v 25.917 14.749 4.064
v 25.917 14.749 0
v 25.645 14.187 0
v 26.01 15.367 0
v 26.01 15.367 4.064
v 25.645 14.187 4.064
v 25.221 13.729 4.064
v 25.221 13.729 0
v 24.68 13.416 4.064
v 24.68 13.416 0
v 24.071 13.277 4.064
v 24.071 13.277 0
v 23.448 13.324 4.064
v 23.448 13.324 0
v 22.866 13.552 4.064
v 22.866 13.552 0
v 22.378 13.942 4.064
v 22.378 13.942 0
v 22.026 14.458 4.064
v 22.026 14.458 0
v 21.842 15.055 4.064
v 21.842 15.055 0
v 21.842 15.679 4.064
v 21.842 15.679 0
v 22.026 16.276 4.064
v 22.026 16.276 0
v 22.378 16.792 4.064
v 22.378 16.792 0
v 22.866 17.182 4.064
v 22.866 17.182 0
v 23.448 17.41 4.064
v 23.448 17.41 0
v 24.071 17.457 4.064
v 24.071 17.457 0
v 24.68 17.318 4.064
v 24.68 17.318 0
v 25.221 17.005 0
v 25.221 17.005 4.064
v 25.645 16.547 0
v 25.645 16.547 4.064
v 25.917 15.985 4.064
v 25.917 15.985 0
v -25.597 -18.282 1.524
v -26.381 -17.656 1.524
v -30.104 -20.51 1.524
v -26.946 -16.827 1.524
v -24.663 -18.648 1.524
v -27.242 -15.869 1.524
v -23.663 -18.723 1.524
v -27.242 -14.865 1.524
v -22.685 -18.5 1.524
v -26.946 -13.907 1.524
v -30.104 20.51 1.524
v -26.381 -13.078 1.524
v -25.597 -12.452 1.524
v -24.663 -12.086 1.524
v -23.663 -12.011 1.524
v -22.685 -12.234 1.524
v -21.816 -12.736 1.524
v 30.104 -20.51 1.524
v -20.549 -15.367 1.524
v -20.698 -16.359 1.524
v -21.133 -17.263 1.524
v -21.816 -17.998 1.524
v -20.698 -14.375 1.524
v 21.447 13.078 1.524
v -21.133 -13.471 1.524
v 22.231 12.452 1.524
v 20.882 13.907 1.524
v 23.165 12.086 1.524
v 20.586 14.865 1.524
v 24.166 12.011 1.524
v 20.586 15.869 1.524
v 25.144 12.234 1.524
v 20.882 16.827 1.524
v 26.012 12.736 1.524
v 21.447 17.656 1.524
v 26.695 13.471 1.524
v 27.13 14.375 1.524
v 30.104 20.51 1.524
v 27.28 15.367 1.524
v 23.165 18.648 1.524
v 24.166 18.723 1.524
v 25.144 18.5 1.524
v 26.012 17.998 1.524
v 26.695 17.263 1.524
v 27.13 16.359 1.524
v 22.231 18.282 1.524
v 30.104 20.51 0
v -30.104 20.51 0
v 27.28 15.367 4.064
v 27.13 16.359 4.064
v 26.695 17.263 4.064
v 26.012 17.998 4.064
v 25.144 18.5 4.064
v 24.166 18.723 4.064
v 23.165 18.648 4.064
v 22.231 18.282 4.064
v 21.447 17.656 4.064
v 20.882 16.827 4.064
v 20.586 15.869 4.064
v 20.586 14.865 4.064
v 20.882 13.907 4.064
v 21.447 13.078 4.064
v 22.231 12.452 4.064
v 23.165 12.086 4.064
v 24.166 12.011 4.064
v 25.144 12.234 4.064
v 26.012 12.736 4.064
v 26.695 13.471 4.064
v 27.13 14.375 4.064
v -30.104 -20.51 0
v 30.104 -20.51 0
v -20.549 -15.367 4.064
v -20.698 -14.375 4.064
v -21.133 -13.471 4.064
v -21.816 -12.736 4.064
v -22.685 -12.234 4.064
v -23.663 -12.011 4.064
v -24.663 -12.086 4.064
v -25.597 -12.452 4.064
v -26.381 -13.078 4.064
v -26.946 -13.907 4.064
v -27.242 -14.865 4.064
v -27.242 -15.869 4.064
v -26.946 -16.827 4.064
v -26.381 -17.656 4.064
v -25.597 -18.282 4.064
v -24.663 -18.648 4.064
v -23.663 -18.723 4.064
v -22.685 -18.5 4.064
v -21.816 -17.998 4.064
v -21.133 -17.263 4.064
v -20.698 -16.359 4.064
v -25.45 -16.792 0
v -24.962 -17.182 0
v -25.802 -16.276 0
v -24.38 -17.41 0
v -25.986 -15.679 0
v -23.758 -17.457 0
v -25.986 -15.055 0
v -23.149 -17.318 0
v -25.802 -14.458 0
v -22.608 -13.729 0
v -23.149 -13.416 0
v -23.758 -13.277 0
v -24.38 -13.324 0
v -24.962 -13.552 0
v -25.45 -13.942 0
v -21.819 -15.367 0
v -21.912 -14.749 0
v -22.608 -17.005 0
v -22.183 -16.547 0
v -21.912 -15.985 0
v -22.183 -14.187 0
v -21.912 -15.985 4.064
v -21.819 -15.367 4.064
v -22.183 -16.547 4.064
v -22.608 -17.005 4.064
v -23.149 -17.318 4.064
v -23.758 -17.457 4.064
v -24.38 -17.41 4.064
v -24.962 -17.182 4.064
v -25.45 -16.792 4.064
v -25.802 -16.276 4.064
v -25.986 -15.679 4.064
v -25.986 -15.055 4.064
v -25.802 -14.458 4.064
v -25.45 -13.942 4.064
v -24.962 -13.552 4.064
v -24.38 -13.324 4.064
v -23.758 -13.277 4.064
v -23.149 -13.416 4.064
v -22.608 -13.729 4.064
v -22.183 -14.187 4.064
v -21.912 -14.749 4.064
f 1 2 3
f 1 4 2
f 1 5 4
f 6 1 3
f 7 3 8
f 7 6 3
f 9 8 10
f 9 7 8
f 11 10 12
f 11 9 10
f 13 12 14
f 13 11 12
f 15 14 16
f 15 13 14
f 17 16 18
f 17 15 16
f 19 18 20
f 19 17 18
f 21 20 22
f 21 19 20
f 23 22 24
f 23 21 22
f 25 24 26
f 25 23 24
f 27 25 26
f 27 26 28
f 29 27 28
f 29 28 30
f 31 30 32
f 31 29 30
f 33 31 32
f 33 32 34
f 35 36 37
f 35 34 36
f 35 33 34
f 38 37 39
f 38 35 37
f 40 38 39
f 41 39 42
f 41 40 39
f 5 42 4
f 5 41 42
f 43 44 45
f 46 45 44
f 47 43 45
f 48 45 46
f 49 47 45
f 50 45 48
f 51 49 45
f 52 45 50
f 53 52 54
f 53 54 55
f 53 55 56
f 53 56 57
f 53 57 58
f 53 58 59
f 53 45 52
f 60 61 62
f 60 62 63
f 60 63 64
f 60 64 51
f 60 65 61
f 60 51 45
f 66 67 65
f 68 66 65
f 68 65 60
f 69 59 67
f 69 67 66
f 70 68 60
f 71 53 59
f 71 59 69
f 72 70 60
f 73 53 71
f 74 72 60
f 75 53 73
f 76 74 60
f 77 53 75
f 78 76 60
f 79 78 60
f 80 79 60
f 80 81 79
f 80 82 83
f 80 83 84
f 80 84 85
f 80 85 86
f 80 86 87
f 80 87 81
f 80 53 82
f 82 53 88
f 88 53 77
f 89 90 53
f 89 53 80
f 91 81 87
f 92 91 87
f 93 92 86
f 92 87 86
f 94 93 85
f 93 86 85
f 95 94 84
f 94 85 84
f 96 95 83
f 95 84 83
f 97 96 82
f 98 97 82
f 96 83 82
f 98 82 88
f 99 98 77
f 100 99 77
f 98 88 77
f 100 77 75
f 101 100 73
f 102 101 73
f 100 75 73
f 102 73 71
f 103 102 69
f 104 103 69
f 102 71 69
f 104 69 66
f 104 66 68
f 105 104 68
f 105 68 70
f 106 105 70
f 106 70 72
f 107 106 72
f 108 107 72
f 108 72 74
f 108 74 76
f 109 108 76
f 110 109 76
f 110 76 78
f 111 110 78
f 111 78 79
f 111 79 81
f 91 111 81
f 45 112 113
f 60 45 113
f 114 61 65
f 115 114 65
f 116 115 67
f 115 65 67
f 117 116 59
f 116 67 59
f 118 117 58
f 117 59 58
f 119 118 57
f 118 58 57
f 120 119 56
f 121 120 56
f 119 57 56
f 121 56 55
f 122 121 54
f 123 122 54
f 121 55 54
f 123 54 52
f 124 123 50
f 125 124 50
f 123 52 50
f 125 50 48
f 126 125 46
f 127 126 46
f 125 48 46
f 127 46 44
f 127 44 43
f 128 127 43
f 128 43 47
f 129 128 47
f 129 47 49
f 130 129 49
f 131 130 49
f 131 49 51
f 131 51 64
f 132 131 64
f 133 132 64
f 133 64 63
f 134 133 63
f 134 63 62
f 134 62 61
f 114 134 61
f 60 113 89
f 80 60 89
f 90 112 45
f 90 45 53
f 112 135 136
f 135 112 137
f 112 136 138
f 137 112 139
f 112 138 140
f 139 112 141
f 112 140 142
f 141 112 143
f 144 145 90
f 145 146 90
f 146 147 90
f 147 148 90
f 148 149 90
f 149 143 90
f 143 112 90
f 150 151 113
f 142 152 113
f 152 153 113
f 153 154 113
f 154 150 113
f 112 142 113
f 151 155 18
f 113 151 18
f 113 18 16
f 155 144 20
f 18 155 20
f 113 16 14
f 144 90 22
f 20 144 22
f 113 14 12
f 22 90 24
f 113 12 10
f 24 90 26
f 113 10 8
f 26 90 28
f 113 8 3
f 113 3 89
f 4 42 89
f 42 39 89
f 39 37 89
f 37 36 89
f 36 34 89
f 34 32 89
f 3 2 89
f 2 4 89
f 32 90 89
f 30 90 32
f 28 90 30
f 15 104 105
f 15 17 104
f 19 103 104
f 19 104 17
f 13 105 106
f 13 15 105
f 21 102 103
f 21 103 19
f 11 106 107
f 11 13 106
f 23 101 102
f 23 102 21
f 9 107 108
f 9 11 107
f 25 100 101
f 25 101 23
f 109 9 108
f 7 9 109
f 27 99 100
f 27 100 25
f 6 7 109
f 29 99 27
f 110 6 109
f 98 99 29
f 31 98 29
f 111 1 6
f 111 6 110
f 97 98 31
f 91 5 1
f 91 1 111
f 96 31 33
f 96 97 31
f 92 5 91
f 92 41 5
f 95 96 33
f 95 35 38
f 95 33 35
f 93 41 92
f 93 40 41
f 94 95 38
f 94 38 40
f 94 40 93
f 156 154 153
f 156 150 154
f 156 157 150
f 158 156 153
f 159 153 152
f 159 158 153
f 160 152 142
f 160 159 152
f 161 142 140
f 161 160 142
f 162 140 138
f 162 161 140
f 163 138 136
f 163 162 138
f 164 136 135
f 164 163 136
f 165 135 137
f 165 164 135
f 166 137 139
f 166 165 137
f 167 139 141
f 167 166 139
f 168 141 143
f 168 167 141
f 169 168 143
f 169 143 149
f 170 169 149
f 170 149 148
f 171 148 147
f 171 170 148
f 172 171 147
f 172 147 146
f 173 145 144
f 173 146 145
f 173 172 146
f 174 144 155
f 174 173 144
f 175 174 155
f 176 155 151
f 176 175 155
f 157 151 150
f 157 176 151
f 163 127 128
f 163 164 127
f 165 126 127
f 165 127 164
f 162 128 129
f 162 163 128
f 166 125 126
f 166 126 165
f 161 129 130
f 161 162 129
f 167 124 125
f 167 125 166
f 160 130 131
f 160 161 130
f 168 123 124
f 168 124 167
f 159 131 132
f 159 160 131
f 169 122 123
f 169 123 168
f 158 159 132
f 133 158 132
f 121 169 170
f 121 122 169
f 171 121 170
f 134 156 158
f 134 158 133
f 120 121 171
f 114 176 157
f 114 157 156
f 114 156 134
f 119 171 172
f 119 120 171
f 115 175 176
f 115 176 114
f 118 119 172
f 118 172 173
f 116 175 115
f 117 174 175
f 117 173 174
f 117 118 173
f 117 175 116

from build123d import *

# Parameters (mm, degrees)
F8_W      = 60.2088514067
F8_H      = 41.021
F9_DEPTH  = 1.524
F6_R      = 3.3655
F6_R_2    = 2.0955
F7_R      = 3.3655
F7_R_2    = 2.0955
F10_DEPTH = 4.064
F11_DEPTH = 25.4


with BuildPart() as f9:
    # F8 (on Top) → F9 (new body)
    with BuildSketch(Plane.XY):
        Rectangle(F8_W, F8_H)
    extrude(amount=F9_DEPTH)

    # F6 (on face) + F7 (on face) → F10 (join)
    with BuildSketch(Plane.XY):
        with Locations((-23.9141, -15.367)):
            Circle(F6_R)
        with Locations((-23.9141, -15.367)):
            Circle(F6_R_2, mode=Mode.SUBTRACT)
    with BuildSketch(Plane.XY):
        with Locations((23.9141, 15.367)):
            Circle(F7_R)
        with Locations((23.9141, 15.367)):
            Circle(F7_R_2, mode=Mode.SUBTRACT)
    extrude(amount=F10_DEPTH)

    # F11 (cut): faces of the model
    f11_faces = [f9.faces().sort_by_distance(p)[0] for p in [
        (-23.9141, -15.367, 1.524),
        (23.9141, 15.367, 1.524),
    ]]
    extrude(f11_faces, amount=-F11_DEPTH, mode=Mode.SUBTRACT)


solid = f9.part
